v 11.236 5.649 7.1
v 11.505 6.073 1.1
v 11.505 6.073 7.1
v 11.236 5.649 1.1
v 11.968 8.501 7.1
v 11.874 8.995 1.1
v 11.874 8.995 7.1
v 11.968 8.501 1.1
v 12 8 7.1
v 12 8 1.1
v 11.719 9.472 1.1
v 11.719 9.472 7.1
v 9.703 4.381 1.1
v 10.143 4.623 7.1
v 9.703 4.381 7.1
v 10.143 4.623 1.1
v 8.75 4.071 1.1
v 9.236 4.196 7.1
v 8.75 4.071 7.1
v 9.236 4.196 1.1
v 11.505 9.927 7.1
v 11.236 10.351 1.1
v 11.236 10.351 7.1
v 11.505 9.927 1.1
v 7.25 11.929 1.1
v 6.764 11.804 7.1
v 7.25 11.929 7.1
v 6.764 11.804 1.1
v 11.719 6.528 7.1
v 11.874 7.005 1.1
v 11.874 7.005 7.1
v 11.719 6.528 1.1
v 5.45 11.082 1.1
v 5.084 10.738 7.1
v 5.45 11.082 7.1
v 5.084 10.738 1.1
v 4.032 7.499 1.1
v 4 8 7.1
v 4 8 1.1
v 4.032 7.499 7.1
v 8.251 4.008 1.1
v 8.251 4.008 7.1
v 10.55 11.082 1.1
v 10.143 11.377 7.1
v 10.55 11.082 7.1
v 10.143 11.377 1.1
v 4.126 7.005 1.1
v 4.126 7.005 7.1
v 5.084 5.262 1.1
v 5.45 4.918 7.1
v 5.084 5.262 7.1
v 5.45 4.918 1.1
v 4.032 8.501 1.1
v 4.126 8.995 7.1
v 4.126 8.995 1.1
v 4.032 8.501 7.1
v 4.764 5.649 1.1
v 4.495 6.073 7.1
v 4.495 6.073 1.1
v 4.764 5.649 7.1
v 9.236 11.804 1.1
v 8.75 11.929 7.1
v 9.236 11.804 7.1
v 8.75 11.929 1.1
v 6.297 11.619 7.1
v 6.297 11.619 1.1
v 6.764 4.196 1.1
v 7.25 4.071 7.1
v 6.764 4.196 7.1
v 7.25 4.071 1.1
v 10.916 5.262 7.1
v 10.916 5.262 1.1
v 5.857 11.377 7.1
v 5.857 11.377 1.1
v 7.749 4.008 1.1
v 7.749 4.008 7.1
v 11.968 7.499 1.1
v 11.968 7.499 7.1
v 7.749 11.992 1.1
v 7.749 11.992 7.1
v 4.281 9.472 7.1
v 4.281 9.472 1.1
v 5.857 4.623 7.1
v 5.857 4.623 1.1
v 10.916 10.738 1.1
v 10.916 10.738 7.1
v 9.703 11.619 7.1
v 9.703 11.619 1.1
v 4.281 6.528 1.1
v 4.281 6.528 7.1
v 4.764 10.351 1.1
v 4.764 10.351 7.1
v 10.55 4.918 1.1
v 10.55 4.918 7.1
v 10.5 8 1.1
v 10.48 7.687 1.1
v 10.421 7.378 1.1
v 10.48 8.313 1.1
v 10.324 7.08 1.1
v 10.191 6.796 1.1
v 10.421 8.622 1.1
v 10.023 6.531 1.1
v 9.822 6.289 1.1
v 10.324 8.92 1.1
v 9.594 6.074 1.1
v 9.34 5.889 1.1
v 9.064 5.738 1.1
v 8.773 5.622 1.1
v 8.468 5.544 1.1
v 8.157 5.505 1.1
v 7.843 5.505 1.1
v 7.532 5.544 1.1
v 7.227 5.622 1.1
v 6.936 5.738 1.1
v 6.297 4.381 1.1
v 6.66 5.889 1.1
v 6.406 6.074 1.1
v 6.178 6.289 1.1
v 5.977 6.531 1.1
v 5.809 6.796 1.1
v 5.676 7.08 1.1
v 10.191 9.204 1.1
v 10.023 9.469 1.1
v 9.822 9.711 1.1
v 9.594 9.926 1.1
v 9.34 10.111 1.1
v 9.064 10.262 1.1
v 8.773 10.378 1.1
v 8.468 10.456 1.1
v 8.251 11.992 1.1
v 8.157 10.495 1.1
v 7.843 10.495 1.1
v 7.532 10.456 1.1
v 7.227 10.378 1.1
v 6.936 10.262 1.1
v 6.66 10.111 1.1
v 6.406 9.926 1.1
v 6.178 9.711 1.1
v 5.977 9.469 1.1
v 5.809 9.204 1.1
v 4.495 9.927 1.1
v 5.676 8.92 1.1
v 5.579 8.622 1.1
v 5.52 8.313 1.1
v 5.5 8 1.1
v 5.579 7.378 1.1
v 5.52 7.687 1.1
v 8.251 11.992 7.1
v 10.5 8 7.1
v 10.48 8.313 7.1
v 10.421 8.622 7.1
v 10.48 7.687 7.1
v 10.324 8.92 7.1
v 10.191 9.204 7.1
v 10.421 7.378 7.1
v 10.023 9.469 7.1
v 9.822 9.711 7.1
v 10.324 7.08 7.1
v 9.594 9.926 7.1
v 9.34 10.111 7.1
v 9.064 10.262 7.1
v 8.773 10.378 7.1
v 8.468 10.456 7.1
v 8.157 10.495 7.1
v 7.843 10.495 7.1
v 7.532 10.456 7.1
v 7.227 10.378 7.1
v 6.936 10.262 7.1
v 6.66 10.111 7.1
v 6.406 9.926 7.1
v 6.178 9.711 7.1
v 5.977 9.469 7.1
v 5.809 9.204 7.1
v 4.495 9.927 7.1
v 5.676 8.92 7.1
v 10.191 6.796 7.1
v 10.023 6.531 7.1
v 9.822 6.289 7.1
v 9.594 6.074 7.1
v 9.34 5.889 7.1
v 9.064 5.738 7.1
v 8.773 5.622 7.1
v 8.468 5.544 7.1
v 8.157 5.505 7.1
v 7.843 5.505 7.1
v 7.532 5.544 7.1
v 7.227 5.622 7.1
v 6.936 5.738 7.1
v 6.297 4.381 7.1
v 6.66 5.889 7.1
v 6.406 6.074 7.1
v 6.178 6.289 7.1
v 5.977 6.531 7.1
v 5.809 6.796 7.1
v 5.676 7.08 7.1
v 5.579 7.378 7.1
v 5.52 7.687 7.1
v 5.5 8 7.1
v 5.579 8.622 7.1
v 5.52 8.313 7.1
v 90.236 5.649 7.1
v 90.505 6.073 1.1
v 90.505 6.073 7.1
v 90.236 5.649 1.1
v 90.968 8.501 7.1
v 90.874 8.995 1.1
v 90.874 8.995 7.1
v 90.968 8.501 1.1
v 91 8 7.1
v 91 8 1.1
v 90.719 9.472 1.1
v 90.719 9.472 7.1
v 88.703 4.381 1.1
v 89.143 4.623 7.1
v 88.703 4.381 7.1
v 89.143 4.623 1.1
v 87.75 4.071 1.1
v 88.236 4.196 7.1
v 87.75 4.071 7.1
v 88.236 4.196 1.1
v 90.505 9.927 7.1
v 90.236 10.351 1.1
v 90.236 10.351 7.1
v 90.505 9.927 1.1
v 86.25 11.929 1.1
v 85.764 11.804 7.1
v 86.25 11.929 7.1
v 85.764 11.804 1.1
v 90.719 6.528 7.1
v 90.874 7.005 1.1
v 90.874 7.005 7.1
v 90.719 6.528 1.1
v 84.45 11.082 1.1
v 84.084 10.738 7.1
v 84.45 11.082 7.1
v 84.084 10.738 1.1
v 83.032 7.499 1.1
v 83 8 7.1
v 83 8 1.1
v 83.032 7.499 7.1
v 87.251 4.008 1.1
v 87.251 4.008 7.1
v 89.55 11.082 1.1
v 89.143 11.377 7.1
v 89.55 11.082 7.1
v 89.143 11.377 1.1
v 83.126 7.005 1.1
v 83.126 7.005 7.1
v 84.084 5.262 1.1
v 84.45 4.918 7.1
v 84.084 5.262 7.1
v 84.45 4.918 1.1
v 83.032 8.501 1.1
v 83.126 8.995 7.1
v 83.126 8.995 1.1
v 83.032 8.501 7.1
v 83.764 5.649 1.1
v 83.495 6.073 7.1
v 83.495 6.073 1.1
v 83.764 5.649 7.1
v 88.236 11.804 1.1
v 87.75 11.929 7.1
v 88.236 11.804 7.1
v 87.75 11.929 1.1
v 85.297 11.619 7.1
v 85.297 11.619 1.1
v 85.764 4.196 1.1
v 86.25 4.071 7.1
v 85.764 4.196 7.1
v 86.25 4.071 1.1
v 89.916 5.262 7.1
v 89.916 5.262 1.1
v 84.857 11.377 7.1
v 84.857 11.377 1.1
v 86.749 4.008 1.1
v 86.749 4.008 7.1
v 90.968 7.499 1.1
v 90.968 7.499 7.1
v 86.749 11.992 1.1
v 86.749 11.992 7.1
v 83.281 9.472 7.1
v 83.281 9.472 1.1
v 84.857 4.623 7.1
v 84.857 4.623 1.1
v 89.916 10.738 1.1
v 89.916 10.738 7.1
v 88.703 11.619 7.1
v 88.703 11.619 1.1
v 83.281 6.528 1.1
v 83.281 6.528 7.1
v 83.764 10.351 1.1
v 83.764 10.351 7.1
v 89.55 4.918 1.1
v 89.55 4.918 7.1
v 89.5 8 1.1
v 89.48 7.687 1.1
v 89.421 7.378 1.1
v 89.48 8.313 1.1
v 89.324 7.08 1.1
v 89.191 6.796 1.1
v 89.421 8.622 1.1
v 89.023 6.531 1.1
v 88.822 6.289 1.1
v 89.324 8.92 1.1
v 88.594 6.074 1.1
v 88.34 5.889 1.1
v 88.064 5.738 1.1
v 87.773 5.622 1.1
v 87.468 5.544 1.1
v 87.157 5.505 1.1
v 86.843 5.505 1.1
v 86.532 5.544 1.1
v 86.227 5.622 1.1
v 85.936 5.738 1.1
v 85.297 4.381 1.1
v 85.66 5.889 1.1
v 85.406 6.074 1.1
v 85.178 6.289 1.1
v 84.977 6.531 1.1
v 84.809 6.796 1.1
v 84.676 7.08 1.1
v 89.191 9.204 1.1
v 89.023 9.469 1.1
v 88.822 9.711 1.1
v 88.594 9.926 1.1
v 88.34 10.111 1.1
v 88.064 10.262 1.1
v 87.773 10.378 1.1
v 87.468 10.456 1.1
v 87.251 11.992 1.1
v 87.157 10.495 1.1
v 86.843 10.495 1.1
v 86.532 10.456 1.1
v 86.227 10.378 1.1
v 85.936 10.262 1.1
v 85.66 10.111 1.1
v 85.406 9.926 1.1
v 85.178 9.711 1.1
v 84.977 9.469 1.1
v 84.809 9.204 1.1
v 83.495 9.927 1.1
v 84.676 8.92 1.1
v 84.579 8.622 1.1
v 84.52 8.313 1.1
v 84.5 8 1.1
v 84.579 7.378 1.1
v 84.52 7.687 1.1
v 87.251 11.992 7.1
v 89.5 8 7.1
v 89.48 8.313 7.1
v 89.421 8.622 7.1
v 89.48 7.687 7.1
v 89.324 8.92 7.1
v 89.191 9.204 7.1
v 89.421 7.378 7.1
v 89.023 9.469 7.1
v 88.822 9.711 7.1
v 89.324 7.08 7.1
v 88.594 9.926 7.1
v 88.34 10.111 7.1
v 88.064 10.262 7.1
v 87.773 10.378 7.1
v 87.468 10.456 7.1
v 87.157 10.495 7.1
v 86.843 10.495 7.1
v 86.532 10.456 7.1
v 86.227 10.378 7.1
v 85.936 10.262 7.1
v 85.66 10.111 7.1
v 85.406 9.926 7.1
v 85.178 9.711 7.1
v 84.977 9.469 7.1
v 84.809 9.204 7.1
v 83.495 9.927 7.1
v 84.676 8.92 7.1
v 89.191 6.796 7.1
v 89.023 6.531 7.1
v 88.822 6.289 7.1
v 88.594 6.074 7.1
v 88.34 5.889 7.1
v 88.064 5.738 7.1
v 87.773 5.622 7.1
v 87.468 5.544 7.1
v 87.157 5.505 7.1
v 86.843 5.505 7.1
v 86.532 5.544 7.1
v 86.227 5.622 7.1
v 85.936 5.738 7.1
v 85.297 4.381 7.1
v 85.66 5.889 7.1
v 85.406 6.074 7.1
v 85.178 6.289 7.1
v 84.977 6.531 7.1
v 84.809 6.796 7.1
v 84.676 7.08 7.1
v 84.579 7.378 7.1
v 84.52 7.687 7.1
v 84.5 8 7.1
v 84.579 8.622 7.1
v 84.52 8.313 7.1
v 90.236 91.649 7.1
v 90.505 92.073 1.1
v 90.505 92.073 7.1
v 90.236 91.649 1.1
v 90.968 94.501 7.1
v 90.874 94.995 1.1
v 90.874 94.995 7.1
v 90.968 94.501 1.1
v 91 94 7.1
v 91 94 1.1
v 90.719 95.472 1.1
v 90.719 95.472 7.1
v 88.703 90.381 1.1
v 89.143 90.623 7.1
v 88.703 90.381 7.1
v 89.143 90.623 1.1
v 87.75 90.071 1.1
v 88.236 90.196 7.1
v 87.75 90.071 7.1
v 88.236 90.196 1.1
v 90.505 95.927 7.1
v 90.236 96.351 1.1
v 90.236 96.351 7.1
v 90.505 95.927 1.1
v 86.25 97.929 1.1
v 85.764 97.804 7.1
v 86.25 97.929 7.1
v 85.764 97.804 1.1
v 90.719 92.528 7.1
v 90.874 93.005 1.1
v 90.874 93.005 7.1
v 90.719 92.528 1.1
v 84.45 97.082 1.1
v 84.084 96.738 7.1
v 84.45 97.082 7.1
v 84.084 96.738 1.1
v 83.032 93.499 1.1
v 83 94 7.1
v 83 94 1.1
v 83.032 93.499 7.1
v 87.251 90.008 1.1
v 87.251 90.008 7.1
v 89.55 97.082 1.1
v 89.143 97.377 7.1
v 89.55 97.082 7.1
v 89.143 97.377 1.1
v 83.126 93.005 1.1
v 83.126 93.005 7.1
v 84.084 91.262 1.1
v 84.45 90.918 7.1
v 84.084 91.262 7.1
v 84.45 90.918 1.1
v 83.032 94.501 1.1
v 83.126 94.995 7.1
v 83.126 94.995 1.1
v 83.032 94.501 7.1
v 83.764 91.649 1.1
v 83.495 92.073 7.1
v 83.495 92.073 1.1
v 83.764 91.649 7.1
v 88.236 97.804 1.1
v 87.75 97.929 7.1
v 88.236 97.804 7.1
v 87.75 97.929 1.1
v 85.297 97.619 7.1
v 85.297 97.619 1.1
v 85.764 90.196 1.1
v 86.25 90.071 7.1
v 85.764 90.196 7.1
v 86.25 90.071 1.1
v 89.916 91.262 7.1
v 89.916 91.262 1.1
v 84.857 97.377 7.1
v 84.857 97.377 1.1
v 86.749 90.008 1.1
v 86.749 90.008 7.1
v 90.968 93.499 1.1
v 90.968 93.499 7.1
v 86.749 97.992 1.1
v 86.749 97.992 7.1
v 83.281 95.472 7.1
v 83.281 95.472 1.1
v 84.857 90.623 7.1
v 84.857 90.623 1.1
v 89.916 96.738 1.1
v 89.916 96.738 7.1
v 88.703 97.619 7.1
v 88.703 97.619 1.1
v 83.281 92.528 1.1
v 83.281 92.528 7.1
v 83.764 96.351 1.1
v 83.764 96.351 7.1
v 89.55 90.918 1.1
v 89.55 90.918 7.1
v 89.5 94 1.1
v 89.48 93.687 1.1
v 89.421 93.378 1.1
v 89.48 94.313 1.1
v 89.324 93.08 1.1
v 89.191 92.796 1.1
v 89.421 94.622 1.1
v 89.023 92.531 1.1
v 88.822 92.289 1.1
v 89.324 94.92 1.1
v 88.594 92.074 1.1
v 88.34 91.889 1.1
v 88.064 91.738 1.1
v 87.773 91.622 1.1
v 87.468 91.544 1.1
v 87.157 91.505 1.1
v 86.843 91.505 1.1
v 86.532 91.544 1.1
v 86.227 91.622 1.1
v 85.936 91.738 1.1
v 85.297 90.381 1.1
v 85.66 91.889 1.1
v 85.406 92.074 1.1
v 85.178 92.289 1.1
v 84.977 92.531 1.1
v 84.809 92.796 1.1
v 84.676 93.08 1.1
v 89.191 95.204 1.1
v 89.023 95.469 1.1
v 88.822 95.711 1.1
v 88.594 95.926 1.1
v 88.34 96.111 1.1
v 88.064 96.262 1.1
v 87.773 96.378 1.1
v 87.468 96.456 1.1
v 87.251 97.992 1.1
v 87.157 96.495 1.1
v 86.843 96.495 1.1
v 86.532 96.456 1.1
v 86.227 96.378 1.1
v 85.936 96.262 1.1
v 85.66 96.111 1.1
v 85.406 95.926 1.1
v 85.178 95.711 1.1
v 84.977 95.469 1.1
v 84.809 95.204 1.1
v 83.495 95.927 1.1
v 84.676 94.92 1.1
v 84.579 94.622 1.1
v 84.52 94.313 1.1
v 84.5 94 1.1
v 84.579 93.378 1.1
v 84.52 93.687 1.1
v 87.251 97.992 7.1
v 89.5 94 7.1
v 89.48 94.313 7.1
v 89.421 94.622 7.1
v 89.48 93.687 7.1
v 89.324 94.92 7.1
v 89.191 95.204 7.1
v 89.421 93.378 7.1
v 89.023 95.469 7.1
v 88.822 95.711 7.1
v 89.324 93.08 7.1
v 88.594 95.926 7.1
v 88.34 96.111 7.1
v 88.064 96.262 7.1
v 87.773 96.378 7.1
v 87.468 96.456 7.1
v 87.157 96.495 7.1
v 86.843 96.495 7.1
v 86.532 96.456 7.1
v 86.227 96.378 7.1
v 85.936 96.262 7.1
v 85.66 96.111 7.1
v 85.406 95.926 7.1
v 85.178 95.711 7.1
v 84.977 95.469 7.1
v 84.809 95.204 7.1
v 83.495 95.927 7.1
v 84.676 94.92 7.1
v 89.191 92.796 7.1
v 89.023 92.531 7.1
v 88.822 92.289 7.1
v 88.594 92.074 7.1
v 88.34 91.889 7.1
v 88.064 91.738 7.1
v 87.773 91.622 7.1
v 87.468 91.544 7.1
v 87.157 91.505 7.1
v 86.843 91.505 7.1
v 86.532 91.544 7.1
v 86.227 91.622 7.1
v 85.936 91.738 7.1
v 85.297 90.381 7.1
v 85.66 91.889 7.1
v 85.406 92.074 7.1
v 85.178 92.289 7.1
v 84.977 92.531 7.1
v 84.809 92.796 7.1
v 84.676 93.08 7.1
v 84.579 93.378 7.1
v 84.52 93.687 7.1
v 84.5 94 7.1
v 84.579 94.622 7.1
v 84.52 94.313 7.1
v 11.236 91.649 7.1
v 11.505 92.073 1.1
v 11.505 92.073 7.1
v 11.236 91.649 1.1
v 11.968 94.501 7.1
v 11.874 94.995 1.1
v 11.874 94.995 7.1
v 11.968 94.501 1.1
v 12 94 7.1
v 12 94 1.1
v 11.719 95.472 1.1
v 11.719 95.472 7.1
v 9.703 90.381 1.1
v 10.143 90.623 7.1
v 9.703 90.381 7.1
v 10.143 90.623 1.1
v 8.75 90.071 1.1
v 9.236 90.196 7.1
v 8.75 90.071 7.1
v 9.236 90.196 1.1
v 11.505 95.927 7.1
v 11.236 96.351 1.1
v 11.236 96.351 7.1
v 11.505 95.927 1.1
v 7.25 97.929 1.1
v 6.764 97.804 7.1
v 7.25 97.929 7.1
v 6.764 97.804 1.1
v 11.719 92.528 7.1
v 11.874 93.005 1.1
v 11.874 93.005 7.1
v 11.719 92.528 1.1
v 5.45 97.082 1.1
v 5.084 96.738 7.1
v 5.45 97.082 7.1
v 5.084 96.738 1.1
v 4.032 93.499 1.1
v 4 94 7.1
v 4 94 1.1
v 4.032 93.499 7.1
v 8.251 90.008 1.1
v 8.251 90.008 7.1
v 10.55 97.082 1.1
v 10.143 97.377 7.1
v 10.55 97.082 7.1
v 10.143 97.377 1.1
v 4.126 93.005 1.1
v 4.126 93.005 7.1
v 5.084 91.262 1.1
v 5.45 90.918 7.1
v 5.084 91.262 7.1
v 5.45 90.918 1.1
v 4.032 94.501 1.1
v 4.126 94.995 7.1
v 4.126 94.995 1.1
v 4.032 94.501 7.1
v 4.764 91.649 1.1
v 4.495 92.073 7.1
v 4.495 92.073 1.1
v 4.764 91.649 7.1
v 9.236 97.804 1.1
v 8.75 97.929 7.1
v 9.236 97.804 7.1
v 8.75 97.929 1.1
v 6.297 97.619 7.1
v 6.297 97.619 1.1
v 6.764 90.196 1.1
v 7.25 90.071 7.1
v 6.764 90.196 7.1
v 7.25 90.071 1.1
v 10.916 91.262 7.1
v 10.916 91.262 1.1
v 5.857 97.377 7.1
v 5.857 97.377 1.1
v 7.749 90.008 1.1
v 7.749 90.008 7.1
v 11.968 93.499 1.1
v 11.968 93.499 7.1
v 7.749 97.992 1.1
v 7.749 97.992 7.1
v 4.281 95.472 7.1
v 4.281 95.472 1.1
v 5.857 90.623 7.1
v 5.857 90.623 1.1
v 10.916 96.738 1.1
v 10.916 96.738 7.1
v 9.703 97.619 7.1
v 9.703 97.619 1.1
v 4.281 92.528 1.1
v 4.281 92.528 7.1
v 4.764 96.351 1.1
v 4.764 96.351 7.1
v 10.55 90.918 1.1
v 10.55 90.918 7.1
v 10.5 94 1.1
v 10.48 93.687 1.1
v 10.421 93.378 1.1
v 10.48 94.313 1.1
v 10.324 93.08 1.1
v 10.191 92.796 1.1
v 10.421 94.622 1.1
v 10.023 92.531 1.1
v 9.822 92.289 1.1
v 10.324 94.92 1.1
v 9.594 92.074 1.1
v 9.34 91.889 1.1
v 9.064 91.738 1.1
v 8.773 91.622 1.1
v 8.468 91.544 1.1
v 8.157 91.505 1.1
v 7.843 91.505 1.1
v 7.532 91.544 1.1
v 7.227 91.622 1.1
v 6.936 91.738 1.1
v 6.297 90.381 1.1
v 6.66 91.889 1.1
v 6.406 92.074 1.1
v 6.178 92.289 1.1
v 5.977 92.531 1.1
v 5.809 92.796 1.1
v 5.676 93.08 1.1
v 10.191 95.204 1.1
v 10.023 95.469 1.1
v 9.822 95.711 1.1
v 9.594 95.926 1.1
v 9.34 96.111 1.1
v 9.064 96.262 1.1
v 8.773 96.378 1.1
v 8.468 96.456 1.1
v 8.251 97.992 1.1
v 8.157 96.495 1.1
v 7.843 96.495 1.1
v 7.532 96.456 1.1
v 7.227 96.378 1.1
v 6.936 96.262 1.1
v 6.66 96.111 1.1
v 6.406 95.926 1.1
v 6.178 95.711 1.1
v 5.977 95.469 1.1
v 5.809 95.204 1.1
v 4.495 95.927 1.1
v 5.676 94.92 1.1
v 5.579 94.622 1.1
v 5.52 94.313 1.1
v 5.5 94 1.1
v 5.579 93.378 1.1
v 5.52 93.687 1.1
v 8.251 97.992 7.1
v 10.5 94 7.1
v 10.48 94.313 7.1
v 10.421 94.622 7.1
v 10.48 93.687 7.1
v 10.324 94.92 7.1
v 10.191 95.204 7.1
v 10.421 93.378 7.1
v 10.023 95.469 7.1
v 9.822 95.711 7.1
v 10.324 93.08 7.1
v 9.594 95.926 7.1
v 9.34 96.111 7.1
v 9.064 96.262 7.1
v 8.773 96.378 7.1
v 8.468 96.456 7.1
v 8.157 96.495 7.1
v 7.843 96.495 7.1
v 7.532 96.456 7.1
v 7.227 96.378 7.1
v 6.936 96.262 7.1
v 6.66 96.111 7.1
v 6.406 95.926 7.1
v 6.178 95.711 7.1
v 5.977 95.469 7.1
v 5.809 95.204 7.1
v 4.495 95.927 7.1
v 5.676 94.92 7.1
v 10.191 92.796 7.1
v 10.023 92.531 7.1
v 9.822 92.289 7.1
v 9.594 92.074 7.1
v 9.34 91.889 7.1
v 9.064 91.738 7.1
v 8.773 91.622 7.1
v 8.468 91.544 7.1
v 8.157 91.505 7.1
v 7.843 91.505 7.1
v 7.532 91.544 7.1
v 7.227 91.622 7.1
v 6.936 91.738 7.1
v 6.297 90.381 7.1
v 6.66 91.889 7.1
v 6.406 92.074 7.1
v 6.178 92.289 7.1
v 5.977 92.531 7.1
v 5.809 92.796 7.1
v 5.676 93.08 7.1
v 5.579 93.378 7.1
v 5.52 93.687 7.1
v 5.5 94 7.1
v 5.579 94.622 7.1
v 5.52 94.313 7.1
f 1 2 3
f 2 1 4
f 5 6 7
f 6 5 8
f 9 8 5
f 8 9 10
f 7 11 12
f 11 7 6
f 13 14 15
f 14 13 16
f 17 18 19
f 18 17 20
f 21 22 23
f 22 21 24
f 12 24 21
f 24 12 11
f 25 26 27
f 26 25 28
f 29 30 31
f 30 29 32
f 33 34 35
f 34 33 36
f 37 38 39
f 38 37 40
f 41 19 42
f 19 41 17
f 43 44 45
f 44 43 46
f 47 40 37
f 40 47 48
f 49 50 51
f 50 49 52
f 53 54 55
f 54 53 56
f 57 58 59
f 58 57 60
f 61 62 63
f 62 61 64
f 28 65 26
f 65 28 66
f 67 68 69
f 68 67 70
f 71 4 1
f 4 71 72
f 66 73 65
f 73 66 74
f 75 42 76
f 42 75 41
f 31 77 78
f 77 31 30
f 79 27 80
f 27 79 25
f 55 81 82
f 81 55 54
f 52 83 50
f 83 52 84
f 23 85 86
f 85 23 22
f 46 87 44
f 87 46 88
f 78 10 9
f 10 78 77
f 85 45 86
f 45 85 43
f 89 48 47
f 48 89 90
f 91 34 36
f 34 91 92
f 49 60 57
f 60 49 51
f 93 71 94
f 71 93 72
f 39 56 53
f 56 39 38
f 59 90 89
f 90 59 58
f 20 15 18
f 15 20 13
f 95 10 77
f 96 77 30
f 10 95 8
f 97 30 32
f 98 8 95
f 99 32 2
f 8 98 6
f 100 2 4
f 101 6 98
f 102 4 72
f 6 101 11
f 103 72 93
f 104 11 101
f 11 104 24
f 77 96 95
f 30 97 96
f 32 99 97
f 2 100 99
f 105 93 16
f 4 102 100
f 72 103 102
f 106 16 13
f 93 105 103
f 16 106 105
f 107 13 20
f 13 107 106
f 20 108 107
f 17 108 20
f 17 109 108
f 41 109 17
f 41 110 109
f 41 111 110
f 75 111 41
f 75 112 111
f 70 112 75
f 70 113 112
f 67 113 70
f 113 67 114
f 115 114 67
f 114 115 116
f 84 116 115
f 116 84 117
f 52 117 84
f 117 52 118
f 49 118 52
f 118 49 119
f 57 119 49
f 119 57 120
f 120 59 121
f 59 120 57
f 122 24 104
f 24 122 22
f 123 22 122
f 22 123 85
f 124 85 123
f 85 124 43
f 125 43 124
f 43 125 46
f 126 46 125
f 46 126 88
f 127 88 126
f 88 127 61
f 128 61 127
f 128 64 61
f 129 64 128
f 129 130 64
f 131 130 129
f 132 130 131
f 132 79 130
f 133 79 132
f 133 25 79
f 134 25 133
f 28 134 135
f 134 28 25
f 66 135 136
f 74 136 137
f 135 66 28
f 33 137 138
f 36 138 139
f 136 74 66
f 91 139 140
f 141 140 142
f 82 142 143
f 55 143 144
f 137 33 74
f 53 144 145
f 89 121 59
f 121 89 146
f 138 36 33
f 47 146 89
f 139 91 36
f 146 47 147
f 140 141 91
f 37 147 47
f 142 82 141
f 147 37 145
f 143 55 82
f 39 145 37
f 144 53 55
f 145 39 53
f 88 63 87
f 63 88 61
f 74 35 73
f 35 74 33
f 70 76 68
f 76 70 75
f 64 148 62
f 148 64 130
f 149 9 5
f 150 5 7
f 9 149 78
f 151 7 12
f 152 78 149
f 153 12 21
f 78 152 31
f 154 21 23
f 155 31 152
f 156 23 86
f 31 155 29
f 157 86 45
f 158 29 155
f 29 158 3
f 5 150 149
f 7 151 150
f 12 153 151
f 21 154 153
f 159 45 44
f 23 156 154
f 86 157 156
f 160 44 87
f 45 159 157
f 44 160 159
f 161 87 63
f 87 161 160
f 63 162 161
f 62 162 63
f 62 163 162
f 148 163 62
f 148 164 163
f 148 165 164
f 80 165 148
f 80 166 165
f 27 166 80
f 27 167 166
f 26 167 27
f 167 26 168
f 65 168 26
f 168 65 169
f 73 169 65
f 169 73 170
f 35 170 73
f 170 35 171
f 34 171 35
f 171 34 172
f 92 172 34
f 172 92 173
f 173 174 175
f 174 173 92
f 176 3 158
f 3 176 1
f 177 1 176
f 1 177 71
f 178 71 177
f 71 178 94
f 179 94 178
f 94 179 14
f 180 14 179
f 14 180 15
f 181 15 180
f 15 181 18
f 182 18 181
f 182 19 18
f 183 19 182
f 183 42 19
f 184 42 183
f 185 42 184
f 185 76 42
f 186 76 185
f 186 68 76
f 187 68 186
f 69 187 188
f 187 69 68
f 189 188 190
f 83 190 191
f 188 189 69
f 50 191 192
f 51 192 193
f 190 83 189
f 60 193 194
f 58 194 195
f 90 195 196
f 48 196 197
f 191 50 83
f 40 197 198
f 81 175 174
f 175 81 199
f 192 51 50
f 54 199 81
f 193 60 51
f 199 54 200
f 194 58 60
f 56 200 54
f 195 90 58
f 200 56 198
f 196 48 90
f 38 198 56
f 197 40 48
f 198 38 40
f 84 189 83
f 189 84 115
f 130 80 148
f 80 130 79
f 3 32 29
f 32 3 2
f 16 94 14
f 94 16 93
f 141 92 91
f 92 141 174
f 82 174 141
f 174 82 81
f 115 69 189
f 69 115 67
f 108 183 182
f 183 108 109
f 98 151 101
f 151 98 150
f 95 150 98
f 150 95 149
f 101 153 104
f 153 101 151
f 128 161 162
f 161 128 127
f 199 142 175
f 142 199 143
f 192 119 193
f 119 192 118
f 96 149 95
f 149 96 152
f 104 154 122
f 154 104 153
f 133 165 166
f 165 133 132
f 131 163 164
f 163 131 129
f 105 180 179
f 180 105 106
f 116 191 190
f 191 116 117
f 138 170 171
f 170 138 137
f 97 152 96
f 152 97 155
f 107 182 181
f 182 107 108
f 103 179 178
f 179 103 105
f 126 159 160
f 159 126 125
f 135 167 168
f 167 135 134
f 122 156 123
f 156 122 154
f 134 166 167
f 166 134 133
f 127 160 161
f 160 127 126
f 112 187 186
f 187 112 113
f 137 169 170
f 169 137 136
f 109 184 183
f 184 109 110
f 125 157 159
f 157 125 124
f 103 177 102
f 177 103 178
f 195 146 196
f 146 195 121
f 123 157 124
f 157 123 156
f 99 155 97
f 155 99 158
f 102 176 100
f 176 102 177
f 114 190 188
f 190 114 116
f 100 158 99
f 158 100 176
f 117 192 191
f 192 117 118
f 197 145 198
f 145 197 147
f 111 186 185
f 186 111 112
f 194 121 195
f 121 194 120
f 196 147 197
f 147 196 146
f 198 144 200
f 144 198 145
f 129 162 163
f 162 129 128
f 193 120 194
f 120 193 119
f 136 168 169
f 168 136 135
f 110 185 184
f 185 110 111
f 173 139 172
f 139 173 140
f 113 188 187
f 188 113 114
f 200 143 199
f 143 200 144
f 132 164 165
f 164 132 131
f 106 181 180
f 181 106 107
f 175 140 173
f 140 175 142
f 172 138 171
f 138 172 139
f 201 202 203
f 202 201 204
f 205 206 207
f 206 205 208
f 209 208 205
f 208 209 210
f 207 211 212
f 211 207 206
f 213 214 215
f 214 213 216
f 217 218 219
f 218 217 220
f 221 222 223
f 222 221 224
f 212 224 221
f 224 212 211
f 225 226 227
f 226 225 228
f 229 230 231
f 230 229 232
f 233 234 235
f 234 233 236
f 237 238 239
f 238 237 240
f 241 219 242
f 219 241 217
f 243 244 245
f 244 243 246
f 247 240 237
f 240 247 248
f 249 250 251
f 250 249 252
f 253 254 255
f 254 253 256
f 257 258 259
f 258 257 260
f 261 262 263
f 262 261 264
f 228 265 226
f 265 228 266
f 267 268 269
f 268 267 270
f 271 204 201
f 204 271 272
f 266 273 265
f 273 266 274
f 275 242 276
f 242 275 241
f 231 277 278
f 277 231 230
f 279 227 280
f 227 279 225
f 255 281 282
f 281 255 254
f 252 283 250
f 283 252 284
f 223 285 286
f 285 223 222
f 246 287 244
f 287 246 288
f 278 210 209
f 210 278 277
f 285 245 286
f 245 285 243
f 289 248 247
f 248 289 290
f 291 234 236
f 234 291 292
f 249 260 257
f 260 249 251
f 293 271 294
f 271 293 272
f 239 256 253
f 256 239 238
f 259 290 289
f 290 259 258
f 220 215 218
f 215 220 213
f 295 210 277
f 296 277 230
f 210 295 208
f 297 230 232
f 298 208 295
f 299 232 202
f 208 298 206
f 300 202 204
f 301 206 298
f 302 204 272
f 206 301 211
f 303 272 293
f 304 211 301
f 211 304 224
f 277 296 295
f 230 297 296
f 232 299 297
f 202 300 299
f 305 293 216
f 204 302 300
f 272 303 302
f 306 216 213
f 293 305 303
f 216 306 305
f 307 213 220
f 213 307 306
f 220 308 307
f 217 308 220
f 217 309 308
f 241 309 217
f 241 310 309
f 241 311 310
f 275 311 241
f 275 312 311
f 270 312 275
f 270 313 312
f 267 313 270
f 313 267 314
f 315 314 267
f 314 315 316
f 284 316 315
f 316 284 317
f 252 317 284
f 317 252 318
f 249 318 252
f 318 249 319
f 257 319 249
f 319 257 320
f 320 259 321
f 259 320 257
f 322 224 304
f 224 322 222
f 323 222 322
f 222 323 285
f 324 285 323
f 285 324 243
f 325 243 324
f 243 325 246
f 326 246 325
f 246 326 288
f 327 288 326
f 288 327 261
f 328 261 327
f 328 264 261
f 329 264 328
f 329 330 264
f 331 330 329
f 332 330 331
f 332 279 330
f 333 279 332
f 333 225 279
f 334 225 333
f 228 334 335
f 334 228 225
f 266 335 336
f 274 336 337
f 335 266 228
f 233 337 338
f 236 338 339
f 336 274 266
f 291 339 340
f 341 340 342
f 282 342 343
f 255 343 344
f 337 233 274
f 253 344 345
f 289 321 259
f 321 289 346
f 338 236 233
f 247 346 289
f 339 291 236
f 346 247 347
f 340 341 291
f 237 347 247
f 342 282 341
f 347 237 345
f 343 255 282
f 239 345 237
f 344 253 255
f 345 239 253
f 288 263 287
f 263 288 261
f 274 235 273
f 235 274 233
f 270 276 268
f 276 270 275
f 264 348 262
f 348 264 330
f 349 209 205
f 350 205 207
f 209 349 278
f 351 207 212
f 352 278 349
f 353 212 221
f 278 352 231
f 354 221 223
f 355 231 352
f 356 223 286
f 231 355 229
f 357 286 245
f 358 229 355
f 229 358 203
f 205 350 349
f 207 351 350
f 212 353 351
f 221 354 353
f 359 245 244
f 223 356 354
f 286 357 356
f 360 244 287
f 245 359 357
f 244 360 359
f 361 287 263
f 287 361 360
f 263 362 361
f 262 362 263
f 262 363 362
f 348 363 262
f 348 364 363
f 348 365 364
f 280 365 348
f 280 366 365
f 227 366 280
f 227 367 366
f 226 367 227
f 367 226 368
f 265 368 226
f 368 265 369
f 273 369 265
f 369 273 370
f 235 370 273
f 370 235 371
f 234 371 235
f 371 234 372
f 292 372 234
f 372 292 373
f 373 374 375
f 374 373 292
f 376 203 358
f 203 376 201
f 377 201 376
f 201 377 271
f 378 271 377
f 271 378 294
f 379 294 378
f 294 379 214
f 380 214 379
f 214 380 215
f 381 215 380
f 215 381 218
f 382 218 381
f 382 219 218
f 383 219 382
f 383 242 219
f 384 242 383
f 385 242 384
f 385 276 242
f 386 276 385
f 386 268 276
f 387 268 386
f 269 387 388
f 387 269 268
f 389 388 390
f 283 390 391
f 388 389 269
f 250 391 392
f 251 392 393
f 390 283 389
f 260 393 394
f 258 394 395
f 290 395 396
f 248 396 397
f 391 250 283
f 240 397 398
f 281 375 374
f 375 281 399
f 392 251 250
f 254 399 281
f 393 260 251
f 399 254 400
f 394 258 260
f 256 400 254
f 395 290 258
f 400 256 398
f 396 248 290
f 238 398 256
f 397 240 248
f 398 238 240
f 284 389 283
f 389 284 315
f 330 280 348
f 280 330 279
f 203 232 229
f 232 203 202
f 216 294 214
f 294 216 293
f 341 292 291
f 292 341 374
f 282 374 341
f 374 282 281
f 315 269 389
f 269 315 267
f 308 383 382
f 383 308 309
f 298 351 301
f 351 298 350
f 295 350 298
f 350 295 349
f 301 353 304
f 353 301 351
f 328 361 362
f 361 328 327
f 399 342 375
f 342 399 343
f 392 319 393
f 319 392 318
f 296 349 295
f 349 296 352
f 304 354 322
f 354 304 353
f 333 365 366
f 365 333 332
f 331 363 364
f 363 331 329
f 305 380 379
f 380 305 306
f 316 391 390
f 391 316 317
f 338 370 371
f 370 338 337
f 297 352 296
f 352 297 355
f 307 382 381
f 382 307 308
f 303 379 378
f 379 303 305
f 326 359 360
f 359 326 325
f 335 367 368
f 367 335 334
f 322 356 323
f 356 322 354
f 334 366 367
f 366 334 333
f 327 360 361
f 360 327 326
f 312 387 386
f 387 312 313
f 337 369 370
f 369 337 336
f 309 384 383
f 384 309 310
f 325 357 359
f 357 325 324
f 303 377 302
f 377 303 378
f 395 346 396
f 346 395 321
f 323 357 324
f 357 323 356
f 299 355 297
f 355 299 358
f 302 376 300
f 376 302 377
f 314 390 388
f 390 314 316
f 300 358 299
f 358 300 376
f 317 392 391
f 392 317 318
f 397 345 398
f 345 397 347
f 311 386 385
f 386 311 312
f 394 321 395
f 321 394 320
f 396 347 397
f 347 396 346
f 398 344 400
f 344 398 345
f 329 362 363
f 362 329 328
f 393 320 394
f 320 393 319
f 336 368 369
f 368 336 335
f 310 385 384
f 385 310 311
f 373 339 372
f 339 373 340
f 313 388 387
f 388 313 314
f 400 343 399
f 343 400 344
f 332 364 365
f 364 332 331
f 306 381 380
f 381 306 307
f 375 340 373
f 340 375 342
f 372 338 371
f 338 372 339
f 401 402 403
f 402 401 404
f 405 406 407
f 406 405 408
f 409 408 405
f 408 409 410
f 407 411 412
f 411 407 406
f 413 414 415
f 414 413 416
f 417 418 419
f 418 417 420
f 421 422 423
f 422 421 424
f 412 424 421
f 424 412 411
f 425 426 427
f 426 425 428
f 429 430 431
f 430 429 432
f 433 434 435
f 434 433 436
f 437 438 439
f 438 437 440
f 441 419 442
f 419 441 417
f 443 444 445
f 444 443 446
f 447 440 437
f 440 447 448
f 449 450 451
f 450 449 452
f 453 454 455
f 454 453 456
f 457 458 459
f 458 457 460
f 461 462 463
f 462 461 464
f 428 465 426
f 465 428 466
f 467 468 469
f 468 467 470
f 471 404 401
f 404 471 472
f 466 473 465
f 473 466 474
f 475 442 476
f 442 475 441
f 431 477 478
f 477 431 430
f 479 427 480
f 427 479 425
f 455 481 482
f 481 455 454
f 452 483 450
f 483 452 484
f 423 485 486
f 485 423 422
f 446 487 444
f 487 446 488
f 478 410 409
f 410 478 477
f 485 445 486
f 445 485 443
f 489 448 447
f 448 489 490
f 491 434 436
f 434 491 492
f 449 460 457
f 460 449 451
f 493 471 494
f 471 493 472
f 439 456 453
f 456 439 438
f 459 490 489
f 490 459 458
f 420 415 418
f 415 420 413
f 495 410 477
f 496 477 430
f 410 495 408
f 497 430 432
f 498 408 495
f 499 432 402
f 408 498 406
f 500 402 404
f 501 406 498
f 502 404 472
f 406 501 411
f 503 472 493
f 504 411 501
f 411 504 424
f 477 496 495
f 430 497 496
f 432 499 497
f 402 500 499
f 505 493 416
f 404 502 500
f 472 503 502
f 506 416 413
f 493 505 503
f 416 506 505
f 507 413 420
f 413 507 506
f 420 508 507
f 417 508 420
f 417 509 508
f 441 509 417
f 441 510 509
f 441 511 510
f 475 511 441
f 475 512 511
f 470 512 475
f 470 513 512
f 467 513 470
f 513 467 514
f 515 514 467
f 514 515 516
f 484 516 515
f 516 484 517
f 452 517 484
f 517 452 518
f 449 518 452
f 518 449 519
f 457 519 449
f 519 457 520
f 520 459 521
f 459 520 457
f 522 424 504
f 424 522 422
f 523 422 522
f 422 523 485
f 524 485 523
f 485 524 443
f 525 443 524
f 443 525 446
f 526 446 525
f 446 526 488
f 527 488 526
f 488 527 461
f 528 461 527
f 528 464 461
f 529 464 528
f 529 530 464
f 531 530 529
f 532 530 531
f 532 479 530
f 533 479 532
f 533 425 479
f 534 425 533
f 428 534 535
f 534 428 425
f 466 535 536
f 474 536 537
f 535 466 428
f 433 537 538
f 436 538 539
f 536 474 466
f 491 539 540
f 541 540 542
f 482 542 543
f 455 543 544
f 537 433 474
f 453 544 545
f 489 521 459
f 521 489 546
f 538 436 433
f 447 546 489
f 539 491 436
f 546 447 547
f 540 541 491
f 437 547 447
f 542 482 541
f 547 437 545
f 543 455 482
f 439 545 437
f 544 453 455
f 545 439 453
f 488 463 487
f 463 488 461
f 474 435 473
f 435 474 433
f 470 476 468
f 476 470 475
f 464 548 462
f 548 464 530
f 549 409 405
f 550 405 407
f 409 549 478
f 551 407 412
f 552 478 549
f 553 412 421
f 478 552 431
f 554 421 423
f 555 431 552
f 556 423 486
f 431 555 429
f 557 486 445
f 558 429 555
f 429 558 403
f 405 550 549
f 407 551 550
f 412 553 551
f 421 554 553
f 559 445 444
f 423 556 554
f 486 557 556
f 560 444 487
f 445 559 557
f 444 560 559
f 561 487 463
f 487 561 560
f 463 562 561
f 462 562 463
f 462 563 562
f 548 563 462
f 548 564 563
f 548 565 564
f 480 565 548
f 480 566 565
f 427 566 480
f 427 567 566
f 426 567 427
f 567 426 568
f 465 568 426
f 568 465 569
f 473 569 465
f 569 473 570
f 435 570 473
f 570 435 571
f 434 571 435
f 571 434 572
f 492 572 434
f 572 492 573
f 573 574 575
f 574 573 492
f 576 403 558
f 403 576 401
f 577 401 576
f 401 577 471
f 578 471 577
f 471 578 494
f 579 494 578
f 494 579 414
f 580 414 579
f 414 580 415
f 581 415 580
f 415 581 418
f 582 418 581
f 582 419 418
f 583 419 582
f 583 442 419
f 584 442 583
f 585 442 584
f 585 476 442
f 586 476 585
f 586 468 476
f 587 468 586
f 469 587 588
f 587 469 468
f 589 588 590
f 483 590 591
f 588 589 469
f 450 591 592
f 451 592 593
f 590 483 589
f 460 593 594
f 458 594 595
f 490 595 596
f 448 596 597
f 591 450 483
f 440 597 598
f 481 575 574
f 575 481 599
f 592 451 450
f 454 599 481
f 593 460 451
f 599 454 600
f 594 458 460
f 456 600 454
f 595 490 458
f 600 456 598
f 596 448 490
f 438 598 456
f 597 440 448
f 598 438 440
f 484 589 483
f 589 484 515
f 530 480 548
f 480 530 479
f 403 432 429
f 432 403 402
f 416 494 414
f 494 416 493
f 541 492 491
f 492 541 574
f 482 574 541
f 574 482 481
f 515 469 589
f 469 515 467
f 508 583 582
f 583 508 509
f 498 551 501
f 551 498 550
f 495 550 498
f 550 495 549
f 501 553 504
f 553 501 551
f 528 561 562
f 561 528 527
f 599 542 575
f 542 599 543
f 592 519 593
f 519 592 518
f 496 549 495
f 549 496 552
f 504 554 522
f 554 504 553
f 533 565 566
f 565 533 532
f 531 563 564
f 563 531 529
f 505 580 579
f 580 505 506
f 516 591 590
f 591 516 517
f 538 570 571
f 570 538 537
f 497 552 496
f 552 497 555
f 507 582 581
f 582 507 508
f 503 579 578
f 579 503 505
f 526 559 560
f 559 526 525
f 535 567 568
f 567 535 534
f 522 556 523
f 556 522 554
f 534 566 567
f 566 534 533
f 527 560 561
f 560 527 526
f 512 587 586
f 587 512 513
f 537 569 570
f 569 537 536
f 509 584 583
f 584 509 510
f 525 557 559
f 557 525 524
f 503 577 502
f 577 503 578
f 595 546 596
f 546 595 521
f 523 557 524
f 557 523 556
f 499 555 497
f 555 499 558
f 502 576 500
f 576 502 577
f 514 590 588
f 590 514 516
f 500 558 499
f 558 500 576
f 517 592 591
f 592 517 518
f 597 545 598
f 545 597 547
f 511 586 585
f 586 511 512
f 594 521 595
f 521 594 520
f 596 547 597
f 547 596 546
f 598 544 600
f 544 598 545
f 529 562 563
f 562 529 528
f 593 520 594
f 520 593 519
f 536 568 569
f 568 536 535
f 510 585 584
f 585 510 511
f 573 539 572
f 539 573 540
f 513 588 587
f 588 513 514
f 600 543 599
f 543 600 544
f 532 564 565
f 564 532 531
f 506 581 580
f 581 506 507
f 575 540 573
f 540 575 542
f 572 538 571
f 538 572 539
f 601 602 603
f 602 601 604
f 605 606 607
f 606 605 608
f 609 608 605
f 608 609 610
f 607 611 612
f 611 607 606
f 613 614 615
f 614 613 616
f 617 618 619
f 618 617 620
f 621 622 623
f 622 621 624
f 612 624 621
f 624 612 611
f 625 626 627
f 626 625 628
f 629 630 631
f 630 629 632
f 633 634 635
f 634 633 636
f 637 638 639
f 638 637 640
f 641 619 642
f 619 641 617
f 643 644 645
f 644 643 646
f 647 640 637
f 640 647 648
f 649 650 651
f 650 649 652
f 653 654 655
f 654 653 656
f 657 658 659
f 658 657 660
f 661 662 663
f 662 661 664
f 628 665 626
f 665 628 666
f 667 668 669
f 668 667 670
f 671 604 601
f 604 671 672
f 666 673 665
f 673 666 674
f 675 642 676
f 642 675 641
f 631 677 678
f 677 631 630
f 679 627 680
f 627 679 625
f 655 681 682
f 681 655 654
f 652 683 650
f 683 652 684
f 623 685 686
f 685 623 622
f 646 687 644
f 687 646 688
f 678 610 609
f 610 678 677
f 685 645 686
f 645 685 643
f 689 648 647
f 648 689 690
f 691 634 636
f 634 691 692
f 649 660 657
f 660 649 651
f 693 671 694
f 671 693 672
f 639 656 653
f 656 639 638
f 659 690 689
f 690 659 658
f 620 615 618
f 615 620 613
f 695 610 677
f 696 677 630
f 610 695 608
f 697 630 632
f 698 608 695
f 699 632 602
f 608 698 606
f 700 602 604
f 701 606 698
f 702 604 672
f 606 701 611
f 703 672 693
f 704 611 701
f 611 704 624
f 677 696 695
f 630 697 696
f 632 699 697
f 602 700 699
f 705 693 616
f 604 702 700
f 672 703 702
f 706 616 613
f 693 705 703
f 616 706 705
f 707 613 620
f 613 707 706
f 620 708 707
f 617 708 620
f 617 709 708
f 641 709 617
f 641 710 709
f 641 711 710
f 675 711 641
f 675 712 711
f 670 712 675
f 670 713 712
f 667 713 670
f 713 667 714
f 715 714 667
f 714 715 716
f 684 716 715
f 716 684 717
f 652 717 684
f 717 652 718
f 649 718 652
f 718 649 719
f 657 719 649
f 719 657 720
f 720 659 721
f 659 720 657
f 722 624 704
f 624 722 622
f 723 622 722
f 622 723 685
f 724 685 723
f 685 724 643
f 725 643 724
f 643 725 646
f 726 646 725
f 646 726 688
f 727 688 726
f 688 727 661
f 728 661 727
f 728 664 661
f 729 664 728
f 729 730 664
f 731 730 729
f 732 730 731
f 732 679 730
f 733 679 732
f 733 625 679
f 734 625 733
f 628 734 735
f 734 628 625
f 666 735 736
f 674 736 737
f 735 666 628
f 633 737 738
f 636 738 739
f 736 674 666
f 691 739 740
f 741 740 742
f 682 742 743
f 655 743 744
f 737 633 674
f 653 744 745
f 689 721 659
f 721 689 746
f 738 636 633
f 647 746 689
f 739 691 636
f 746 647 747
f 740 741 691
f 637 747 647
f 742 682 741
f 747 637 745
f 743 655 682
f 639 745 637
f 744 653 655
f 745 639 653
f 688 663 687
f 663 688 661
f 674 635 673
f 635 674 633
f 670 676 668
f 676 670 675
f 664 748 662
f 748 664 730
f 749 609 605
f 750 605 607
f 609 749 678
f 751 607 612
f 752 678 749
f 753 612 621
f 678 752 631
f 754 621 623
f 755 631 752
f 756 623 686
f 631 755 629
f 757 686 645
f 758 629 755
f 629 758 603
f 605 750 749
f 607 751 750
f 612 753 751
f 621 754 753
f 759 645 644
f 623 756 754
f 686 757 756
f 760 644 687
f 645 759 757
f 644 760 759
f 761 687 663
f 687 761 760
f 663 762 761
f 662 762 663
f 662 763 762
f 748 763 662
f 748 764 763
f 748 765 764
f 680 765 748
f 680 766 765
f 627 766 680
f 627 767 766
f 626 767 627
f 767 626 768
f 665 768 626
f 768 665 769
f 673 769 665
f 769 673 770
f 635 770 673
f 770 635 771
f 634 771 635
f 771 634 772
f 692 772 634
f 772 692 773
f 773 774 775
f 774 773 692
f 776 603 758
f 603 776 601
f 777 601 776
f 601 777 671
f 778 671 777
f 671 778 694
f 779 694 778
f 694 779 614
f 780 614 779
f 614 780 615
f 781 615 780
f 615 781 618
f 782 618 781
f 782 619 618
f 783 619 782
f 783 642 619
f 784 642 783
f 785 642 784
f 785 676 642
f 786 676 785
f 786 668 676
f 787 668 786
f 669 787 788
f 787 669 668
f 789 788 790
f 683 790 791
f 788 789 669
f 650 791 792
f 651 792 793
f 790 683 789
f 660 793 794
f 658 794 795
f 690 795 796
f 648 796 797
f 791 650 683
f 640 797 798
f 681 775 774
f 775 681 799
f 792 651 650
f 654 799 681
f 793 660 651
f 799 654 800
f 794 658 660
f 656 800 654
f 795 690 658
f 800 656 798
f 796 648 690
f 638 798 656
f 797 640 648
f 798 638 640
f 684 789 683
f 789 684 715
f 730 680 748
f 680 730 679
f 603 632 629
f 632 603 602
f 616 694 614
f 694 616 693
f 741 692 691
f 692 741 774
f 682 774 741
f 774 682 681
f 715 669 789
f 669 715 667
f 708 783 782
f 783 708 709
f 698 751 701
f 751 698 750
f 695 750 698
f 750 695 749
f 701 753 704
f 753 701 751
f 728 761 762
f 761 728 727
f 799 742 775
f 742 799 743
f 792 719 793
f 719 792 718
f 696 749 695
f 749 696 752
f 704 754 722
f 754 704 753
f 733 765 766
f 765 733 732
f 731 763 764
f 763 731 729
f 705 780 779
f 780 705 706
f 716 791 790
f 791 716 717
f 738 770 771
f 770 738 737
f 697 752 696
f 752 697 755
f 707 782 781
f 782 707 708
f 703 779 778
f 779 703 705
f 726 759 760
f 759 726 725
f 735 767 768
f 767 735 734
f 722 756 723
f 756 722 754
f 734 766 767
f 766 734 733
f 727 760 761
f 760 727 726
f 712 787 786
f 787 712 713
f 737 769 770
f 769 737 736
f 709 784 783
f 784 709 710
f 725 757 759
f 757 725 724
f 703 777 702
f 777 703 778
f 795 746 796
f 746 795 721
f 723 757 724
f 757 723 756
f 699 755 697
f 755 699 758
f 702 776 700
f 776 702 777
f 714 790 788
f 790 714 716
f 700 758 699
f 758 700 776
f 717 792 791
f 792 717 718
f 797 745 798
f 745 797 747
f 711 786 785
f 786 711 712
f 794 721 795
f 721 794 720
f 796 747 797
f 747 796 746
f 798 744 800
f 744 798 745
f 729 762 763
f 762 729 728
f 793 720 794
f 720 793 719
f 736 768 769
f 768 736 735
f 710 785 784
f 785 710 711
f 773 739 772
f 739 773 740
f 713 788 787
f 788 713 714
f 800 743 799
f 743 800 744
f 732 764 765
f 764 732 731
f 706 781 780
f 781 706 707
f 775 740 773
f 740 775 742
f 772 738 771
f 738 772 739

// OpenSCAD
// file: ../robot_settings.scad
main_box_x = 95; // 96
main_box_y = 102;
main_box_z = 74; // 74.5
wall_thickness = 2;

rail_gap = 2;
rail_inset = 7;

rail_thickness = 7;
rail_length = 250;
rail_width = 200;

raspberry_pi_screw_seperation_y = 57;
raspberry_pi_screw_seperation_z = 48;
raspberry_pi_peg_h = 5;

battery_box_peg_h = 6;
battery_box_peg_d = 8;
battery_box_peg_cutout = 5;

gears_module = 1;
pinion_gear_teeth = 30;
pinion_gear_width = 5;
pinion_gear_bore = 4;

gears_setback_distance = 25;
gear_post_height = 2 * pinion_gear_width + rail_thickness + 8 ;

steering_motor_mount_x = 45;
steering_motor_mount_y = 36;
steering_motor_mount_z = 18;
steering_motor_mount_setback_distance = gears_setback_distance + 16;

dc_motor_drivertype = "Teyleten"; // Teyleten
isAdafruit = (dc_motor_drivertype == "Adafruit");

drv8871_x = isAdafruit ? 20.3 : 21.6;
drv8871_y = isAdafruit ?  24 : 25;

drv8871_z = 2;
drv8871_screw_d = 2.5;
drv8871_solder_points_z = 2;

drv8871mount_edge_x = 1.5;
drv8871mount_edge_wall = 3;
drv8871mount_z = 5;
drv8871mount_x = drv8871_x +  drv8871mount_edge_wall - 2* drv8871mount_edge_x;
drv8871mount_y = 19;

drv8871_screw_distance = 15.64;
drv8871_solder_points_d = 1.66;
drv8871_solder_offset_y = 4.4;
drv8871_solder_inner_points_distance = 5;
drv8871_solder_outer_points_distance = 12;

dc_motor_housing_minus_encoder_z = 48;
dc_motor_encoder_z = 9.33;
dc_motor_encoder_wheel_d = 13.4;
dc_motor_encoder_wheel_thickness = 5;
dc_motor_encoder_wheel_gap = 3;
dc_motor_encoder_circuit_thickness = 2;
dc_motor_cutout_d = 24.8;
dc_motor_cutout_z = 19.5;

dc_motor_screw_head_z = 2;
dc_motor_screw_head_d = 5.6;
dc_motor_screw_d = 3.2;
dc_motor_screw_offset = 8.5;

dc_motor_axle_ring_z = 3;
dc_motor_axle_ring_d = 7.2;
dc_motor_axle_cutout_d = 4.5;
dc_motor_axle_cutout_z = 10;
dc_motor_axle_notch_cutout = 0.4;
dc_motor_axle_notch_cutout_z = 6;

pdmount_x = 20;
pdmount_y = 30;
pdmount_z = 2;
pdmount_edge_x = 1.5;
pdmount_edge_wall = 3;

steering_shaft_z = 45;
steering_shaft_d = 7;
steering_shaft_motor_fitting_d = 9;
coupler_length = 24.6;
coupler_diameter = 14;
coupler_screw_d = 4;
coupler_screw_z_offset = 5;
coupler_gear_side_insert = 12.6;
steering_shaft_with_coupler_z = steering_shaft_z - coupler_gear_side_insert;

lidar_mount_y = 110;
lidar_mount_x = 65 + 20;
lidar_narrow_screws = 40;
lidar_wide_screws = 56;
lidar_front_to_back_screws = 70;
lidar_screw_d = 3;
lidar_circuitboard_x = 20;
lidar_circuitboard_y = 35;
lidar_circuitboard_z = 1.2;
lidar_cord_length = 29;

ball_bearing_height = 7;
ball_bearing_outer_diameter = 22;
ball_bearing_inner_diameter = 8;

 armature_holder_height = 20;
 armature_holder_thickness = 8;
pull_bar_peg_r = 3.2;
apparatus_locking_peg_d = 4;

rack_module = 1;
rack_length = main_box_x / 2;
rack_height = 10;
rack_width = 10;
rack_teeth = 30;
rack_bore = 3;

pull_bar_length = rail_width / 2 - rack_length + 1;

// tire hardware
axle_length = 30;
axle_reciever_inner_diameter = 7.75;
axle_reciever_length = 18.8;
axle_notch_length = 7;
axle_notch_cutout = 2.4;

// power distribution bar
power_bar_cutout_x = 96;
power_bar_y = 19.1;
power_bar_z = 1.5;
power_bar_screw_distance = 91.4;
power_bar_screw_d = 2.8;
power_bar_standoff_z = 5;
power_bar_standoff_d = 6.83;

// breadboard
breadboard_wall_thickness = 3;
breadboard_width = 55;
breadboard_length = 83;
breadboard_height = 10.5;
breadboard_notch_width = 4.2;
breadboard_longside_notch_separation = 58.2 - breadboard_notch_width / 2;
breadboard_shortside_notch_separation = 26.3 - breadboard_notch_width;

pico_expander_width = 63;
pico_expander_height = 57;
pico_screw_hole_offset = 3;
pico_screw_hole_d = 2.5;

usbhub_thickness = 11.7;
usbhub_depth = 37.5;
usbhub_width = 86.7;
usbhub_end_port_width = 14.8;
usbhub_end_port_height = 12;
usbhub_front_face_safe_zone_left = 15;
usbhub_front_face_safe_zone_right = 14.8;

switch_w = 16;
switch_cutout_d = 12.2;
switch_bump_h = 2;
switch_bump_l = 18.2;
// main file
   include <../robot_settings.scad>
   $fn = 50;
 
 module battery_box_peg_mounts(
  show_mounts = true,
  show_points = false) 
  {

if (show_mounts) 
{
  // temporary base platform
  //translate([0, 0, battery_box_peg_d / 2 + 3])
  //cube([main_box_x, main_box_y, 2]);
  
   translate([0, 0, battery_box_peg_d / 2 + .1])
   {
     color("green")
    translate([battery_box_peg_d, battery_box_peg_d, 0])
      difference() {
        cylinder(h = battery_box_peg_h, d = battery_box_peg_d, center = true);
       translate([0, 0, -.1])
        cylinder(h = battery_box_peg_h + 1, d = battery_box_peg_cutout, center = true); 
      }

  color("red")
    translate([-battery_box_peg_d + main_box_x, battery_box_peg_d, 0])
      difference() {
        cylinder(h = battery_box_peg_h, d = battery_box_peg_d, center = true);
       translate([0, 0, -.1])
        cylinder(h = battery_box_peg_h + 1, d = battery_box_peg_cutout, center = true); 
      }

  color("white")
    translate([-battery_box_peg_d + main_box_x, -battery_box_peg_d + main_box_y, 0])
      difference() {
        cylinder(h = battery_box_peg_h, d = battery_box_peg_d, center = true);
       translate([0, 0, -.1])
        cylinder(h = battery_box_peg_h + 1, d = battery_box_peg_cutout, center = true); 
      }
     
    translate([battery_box_peg_d, -battery_box_peg_d + main_box_y, 0])
      difference() {
        cylinder(h = battery_box_peg_h, d = battery_box_peg_d, center = true);
       translate([0, 0, -.1])
        cylinder(h = battery_box_peg_h + 1, d = battery_box_peg_cutout, center = true); 
      } 
    }
  }
    if (show_points) {
      // temporary base platform
     //translate([0,0, -battery_box_peg_h + 2])
      //cube([main_box_x, main_box_y, 2]);
      
      cutout_offset = .4;
      
      // battery box attachment points
       translate([0, 0, battery_box_peg_d / 2 - battery_box_peg_h - .1]) 
      {
        translate([battery_box_peg_d, battery_box_peg_d, 0])
        cylinder(h = battery_box_peg_h, d = battery_box_peg_cutout - cutout_offset);

        translate([-battery_box_peg_d + main_box_x, battery_box_peg_d, 0])
        cylinder(h = battery_box_peg_h, d = battery_box_peg_cutout - cutout_offset);

        translate([-battery_box_peg_d + main_box_x, -battery_box_peg_d + main_box_y, 0])
        cylinder(h = battery_box_peg_h, d = battery_box_peg_cutout - cutout_offset);

        translate([battery_box_peg_d, -battery_box_peg_d + main_box_y, 0])
        cylinder(h = battery_box_peg_h, d = battery_box_peg_cutout - cutout_offset);
       }
   }

}
battery_box_peg_mounts();
